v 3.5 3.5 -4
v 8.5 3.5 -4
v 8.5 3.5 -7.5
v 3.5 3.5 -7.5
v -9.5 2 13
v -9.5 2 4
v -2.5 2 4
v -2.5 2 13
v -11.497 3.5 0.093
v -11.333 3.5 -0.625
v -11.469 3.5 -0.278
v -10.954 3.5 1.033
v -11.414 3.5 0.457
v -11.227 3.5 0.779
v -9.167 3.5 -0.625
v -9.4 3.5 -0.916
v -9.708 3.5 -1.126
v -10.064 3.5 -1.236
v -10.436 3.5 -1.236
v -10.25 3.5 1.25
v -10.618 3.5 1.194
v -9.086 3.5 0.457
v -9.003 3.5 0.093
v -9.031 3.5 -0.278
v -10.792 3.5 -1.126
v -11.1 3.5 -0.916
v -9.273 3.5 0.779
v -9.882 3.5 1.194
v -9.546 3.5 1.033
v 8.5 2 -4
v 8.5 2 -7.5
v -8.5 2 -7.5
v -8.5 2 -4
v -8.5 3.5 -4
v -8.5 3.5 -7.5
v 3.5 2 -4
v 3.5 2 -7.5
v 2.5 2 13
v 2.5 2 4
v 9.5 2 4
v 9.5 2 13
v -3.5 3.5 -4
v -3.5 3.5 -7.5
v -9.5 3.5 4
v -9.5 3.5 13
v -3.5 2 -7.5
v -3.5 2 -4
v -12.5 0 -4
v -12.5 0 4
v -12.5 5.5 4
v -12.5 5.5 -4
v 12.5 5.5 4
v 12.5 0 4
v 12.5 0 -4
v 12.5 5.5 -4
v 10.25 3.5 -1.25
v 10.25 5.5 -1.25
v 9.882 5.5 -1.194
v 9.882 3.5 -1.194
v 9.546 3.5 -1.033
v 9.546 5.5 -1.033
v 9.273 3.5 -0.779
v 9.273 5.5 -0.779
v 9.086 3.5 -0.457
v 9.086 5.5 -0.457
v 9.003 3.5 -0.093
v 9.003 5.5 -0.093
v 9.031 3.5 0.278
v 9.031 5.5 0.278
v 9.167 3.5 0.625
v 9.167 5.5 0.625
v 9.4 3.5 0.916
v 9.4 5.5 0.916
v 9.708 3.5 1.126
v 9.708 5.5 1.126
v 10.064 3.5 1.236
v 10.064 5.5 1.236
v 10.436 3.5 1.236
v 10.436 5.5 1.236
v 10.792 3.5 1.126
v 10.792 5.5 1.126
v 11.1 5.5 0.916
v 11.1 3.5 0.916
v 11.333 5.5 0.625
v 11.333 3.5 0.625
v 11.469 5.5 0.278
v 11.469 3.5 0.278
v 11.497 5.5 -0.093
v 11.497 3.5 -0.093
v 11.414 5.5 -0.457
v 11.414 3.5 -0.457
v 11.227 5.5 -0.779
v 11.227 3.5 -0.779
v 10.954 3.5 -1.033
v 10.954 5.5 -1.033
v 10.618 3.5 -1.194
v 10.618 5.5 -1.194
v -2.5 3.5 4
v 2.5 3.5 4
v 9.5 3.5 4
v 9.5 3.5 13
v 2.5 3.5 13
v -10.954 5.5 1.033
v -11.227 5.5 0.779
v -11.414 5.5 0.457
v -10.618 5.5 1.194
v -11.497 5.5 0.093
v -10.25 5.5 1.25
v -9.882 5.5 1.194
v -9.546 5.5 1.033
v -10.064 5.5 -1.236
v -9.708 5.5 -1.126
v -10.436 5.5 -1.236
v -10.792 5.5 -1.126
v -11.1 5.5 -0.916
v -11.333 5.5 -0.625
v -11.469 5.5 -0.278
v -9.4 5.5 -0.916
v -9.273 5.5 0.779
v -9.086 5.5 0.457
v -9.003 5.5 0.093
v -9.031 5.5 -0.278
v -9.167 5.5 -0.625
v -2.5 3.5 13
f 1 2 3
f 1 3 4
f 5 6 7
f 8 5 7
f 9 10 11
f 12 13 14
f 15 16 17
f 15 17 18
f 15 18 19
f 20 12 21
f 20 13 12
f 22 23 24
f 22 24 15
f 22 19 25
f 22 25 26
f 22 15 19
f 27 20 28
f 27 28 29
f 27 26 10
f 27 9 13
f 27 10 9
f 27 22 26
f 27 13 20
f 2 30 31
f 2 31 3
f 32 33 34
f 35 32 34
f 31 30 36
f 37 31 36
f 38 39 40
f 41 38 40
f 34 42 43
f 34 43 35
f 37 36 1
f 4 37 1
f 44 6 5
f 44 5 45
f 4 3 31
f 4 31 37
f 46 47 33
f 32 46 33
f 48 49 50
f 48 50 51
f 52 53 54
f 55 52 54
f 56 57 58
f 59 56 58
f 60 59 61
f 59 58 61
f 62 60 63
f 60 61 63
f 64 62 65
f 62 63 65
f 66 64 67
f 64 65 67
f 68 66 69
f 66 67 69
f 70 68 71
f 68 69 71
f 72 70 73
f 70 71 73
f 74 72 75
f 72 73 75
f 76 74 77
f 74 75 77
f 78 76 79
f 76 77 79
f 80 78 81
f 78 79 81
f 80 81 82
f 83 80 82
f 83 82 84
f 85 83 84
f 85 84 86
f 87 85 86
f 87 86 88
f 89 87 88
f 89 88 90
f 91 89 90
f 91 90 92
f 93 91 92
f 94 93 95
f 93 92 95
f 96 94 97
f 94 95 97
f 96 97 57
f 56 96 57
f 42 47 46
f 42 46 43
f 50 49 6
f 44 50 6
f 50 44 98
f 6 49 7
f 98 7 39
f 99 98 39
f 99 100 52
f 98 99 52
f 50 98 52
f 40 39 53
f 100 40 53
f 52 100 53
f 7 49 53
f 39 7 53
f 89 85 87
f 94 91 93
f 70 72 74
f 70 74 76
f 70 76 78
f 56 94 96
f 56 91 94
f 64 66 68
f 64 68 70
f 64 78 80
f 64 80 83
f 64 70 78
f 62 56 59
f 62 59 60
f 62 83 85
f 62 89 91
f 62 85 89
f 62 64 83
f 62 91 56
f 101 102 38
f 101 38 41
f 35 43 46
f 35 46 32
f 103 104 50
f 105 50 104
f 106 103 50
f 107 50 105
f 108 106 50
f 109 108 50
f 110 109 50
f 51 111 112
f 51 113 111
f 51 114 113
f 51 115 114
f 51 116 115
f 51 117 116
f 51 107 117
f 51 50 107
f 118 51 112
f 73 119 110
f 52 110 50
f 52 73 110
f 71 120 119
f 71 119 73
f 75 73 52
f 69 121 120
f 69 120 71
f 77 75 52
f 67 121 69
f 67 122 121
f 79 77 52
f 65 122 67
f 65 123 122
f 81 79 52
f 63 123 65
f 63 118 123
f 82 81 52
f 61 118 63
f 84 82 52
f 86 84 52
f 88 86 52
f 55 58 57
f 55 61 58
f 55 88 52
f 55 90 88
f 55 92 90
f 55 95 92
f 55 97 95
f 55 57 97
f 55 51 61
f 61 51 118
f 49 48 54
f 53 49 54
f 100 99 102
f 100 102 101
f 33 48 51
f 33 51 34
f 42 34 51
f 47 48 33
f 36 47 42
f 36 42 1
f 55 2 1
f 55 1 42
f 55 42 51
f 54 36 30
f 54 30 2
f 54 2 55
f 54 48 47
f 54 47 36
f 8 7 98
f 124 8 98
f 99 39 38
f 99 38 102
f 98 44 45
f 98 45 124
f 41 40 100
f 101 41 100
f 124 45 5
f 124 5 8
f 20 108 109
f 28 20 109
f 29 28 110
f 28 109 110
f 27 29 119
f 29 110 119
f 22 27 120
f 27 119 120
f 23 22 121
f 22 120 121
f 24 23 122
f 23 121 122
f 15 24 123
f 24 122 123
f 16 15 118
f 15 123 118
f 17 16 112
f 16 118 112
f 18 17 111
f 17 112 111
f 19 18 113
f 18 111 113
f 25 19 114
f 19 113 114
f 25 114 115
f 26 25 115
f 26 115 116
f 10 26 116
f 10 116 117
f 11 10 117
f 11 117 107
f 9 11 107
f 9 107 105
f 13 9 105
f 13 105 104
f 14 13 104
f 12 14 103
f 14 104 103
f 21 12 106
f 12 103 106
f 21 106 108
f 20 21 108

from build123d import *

# Parameters (mm, degrees)
SKETCH_1_W          = 25
SKETCH_1_H          = 8
EXTRUDE_1_DEPTH     = 5.5
SKETCH_3_W          = 7
SKETCH_3_H          = 1.5
EXTRUDE_3_DEPTH     = 9
SKETCH_4_W          = 5
SKETCH_4_H          = 1.5
EXTRUDE_4_DEPTH     = 3.5
SKETCH_5_R          = 1.25
CUT_EXTRUDE_1_DEPTH = 2


with BuildPart() as part:
    # 草图1 → 凸台-拉伸1 (new body)
    with BuildSketch(Plane(origin=(0, 0, 0), x_dir=(1, 0, 0), z_dir=(0, 1, 0))):
        Rectangle(SKETCH_1_W, SKETCH_1_H)
    extrude(amount=EXTRUDE_1_DEPTH)

    # 草图3 → 凸台-拉伸3 (add)
    with BuildSketch(Plane.XY.offset(4)):
        with Locations((-6, 2.75)):
            Rectangle(SKETCH_3_W, SKETCH_3_H)
        with Locations((6, 2.75)):
            Rectangle(SKETCH_3_W, SKETCH_3_H)
    extrude(amount=EXTRUDE_3_DEPTH)

    # 草图4 → 凸台-拉伸4 (add)
    with BuildSketch(Plane(origin=(0, 0, -4), x_dir=(-1, 0, 0), z_dir=(0, 0, -1))):
        with Locations((-6, 2.75)):
            Rectangle(SKETCH_4_W, SKETCH_4_H)
        with Locations((6, 2.75)):
            Rectangle(SKETCH_4_W, SKETCH_4_H)
    extrude(amount=EXTRUDE_4_DEPTH)

    # 草图5 → 切除-拉伸1 (cut)
    with BuildSketch(Plane(origin=(0, 5.5, 0), x_dir=(1, 0, 0), z_dir=(0, 1, 0))):
        with Locations(Location((-10.25, 0, 0), (0, 0, 270))):
            Circle(SKETCH_5_R)
        with Locations(Location((10.25, 0, 0), (0, 0, 90))):
            Circle(SKETCH_5_R)
    extrude(amount=-CUT_EXTRUDE_1_DEPTH, mode=Mode.SUBTRACT)


solid = part.part
